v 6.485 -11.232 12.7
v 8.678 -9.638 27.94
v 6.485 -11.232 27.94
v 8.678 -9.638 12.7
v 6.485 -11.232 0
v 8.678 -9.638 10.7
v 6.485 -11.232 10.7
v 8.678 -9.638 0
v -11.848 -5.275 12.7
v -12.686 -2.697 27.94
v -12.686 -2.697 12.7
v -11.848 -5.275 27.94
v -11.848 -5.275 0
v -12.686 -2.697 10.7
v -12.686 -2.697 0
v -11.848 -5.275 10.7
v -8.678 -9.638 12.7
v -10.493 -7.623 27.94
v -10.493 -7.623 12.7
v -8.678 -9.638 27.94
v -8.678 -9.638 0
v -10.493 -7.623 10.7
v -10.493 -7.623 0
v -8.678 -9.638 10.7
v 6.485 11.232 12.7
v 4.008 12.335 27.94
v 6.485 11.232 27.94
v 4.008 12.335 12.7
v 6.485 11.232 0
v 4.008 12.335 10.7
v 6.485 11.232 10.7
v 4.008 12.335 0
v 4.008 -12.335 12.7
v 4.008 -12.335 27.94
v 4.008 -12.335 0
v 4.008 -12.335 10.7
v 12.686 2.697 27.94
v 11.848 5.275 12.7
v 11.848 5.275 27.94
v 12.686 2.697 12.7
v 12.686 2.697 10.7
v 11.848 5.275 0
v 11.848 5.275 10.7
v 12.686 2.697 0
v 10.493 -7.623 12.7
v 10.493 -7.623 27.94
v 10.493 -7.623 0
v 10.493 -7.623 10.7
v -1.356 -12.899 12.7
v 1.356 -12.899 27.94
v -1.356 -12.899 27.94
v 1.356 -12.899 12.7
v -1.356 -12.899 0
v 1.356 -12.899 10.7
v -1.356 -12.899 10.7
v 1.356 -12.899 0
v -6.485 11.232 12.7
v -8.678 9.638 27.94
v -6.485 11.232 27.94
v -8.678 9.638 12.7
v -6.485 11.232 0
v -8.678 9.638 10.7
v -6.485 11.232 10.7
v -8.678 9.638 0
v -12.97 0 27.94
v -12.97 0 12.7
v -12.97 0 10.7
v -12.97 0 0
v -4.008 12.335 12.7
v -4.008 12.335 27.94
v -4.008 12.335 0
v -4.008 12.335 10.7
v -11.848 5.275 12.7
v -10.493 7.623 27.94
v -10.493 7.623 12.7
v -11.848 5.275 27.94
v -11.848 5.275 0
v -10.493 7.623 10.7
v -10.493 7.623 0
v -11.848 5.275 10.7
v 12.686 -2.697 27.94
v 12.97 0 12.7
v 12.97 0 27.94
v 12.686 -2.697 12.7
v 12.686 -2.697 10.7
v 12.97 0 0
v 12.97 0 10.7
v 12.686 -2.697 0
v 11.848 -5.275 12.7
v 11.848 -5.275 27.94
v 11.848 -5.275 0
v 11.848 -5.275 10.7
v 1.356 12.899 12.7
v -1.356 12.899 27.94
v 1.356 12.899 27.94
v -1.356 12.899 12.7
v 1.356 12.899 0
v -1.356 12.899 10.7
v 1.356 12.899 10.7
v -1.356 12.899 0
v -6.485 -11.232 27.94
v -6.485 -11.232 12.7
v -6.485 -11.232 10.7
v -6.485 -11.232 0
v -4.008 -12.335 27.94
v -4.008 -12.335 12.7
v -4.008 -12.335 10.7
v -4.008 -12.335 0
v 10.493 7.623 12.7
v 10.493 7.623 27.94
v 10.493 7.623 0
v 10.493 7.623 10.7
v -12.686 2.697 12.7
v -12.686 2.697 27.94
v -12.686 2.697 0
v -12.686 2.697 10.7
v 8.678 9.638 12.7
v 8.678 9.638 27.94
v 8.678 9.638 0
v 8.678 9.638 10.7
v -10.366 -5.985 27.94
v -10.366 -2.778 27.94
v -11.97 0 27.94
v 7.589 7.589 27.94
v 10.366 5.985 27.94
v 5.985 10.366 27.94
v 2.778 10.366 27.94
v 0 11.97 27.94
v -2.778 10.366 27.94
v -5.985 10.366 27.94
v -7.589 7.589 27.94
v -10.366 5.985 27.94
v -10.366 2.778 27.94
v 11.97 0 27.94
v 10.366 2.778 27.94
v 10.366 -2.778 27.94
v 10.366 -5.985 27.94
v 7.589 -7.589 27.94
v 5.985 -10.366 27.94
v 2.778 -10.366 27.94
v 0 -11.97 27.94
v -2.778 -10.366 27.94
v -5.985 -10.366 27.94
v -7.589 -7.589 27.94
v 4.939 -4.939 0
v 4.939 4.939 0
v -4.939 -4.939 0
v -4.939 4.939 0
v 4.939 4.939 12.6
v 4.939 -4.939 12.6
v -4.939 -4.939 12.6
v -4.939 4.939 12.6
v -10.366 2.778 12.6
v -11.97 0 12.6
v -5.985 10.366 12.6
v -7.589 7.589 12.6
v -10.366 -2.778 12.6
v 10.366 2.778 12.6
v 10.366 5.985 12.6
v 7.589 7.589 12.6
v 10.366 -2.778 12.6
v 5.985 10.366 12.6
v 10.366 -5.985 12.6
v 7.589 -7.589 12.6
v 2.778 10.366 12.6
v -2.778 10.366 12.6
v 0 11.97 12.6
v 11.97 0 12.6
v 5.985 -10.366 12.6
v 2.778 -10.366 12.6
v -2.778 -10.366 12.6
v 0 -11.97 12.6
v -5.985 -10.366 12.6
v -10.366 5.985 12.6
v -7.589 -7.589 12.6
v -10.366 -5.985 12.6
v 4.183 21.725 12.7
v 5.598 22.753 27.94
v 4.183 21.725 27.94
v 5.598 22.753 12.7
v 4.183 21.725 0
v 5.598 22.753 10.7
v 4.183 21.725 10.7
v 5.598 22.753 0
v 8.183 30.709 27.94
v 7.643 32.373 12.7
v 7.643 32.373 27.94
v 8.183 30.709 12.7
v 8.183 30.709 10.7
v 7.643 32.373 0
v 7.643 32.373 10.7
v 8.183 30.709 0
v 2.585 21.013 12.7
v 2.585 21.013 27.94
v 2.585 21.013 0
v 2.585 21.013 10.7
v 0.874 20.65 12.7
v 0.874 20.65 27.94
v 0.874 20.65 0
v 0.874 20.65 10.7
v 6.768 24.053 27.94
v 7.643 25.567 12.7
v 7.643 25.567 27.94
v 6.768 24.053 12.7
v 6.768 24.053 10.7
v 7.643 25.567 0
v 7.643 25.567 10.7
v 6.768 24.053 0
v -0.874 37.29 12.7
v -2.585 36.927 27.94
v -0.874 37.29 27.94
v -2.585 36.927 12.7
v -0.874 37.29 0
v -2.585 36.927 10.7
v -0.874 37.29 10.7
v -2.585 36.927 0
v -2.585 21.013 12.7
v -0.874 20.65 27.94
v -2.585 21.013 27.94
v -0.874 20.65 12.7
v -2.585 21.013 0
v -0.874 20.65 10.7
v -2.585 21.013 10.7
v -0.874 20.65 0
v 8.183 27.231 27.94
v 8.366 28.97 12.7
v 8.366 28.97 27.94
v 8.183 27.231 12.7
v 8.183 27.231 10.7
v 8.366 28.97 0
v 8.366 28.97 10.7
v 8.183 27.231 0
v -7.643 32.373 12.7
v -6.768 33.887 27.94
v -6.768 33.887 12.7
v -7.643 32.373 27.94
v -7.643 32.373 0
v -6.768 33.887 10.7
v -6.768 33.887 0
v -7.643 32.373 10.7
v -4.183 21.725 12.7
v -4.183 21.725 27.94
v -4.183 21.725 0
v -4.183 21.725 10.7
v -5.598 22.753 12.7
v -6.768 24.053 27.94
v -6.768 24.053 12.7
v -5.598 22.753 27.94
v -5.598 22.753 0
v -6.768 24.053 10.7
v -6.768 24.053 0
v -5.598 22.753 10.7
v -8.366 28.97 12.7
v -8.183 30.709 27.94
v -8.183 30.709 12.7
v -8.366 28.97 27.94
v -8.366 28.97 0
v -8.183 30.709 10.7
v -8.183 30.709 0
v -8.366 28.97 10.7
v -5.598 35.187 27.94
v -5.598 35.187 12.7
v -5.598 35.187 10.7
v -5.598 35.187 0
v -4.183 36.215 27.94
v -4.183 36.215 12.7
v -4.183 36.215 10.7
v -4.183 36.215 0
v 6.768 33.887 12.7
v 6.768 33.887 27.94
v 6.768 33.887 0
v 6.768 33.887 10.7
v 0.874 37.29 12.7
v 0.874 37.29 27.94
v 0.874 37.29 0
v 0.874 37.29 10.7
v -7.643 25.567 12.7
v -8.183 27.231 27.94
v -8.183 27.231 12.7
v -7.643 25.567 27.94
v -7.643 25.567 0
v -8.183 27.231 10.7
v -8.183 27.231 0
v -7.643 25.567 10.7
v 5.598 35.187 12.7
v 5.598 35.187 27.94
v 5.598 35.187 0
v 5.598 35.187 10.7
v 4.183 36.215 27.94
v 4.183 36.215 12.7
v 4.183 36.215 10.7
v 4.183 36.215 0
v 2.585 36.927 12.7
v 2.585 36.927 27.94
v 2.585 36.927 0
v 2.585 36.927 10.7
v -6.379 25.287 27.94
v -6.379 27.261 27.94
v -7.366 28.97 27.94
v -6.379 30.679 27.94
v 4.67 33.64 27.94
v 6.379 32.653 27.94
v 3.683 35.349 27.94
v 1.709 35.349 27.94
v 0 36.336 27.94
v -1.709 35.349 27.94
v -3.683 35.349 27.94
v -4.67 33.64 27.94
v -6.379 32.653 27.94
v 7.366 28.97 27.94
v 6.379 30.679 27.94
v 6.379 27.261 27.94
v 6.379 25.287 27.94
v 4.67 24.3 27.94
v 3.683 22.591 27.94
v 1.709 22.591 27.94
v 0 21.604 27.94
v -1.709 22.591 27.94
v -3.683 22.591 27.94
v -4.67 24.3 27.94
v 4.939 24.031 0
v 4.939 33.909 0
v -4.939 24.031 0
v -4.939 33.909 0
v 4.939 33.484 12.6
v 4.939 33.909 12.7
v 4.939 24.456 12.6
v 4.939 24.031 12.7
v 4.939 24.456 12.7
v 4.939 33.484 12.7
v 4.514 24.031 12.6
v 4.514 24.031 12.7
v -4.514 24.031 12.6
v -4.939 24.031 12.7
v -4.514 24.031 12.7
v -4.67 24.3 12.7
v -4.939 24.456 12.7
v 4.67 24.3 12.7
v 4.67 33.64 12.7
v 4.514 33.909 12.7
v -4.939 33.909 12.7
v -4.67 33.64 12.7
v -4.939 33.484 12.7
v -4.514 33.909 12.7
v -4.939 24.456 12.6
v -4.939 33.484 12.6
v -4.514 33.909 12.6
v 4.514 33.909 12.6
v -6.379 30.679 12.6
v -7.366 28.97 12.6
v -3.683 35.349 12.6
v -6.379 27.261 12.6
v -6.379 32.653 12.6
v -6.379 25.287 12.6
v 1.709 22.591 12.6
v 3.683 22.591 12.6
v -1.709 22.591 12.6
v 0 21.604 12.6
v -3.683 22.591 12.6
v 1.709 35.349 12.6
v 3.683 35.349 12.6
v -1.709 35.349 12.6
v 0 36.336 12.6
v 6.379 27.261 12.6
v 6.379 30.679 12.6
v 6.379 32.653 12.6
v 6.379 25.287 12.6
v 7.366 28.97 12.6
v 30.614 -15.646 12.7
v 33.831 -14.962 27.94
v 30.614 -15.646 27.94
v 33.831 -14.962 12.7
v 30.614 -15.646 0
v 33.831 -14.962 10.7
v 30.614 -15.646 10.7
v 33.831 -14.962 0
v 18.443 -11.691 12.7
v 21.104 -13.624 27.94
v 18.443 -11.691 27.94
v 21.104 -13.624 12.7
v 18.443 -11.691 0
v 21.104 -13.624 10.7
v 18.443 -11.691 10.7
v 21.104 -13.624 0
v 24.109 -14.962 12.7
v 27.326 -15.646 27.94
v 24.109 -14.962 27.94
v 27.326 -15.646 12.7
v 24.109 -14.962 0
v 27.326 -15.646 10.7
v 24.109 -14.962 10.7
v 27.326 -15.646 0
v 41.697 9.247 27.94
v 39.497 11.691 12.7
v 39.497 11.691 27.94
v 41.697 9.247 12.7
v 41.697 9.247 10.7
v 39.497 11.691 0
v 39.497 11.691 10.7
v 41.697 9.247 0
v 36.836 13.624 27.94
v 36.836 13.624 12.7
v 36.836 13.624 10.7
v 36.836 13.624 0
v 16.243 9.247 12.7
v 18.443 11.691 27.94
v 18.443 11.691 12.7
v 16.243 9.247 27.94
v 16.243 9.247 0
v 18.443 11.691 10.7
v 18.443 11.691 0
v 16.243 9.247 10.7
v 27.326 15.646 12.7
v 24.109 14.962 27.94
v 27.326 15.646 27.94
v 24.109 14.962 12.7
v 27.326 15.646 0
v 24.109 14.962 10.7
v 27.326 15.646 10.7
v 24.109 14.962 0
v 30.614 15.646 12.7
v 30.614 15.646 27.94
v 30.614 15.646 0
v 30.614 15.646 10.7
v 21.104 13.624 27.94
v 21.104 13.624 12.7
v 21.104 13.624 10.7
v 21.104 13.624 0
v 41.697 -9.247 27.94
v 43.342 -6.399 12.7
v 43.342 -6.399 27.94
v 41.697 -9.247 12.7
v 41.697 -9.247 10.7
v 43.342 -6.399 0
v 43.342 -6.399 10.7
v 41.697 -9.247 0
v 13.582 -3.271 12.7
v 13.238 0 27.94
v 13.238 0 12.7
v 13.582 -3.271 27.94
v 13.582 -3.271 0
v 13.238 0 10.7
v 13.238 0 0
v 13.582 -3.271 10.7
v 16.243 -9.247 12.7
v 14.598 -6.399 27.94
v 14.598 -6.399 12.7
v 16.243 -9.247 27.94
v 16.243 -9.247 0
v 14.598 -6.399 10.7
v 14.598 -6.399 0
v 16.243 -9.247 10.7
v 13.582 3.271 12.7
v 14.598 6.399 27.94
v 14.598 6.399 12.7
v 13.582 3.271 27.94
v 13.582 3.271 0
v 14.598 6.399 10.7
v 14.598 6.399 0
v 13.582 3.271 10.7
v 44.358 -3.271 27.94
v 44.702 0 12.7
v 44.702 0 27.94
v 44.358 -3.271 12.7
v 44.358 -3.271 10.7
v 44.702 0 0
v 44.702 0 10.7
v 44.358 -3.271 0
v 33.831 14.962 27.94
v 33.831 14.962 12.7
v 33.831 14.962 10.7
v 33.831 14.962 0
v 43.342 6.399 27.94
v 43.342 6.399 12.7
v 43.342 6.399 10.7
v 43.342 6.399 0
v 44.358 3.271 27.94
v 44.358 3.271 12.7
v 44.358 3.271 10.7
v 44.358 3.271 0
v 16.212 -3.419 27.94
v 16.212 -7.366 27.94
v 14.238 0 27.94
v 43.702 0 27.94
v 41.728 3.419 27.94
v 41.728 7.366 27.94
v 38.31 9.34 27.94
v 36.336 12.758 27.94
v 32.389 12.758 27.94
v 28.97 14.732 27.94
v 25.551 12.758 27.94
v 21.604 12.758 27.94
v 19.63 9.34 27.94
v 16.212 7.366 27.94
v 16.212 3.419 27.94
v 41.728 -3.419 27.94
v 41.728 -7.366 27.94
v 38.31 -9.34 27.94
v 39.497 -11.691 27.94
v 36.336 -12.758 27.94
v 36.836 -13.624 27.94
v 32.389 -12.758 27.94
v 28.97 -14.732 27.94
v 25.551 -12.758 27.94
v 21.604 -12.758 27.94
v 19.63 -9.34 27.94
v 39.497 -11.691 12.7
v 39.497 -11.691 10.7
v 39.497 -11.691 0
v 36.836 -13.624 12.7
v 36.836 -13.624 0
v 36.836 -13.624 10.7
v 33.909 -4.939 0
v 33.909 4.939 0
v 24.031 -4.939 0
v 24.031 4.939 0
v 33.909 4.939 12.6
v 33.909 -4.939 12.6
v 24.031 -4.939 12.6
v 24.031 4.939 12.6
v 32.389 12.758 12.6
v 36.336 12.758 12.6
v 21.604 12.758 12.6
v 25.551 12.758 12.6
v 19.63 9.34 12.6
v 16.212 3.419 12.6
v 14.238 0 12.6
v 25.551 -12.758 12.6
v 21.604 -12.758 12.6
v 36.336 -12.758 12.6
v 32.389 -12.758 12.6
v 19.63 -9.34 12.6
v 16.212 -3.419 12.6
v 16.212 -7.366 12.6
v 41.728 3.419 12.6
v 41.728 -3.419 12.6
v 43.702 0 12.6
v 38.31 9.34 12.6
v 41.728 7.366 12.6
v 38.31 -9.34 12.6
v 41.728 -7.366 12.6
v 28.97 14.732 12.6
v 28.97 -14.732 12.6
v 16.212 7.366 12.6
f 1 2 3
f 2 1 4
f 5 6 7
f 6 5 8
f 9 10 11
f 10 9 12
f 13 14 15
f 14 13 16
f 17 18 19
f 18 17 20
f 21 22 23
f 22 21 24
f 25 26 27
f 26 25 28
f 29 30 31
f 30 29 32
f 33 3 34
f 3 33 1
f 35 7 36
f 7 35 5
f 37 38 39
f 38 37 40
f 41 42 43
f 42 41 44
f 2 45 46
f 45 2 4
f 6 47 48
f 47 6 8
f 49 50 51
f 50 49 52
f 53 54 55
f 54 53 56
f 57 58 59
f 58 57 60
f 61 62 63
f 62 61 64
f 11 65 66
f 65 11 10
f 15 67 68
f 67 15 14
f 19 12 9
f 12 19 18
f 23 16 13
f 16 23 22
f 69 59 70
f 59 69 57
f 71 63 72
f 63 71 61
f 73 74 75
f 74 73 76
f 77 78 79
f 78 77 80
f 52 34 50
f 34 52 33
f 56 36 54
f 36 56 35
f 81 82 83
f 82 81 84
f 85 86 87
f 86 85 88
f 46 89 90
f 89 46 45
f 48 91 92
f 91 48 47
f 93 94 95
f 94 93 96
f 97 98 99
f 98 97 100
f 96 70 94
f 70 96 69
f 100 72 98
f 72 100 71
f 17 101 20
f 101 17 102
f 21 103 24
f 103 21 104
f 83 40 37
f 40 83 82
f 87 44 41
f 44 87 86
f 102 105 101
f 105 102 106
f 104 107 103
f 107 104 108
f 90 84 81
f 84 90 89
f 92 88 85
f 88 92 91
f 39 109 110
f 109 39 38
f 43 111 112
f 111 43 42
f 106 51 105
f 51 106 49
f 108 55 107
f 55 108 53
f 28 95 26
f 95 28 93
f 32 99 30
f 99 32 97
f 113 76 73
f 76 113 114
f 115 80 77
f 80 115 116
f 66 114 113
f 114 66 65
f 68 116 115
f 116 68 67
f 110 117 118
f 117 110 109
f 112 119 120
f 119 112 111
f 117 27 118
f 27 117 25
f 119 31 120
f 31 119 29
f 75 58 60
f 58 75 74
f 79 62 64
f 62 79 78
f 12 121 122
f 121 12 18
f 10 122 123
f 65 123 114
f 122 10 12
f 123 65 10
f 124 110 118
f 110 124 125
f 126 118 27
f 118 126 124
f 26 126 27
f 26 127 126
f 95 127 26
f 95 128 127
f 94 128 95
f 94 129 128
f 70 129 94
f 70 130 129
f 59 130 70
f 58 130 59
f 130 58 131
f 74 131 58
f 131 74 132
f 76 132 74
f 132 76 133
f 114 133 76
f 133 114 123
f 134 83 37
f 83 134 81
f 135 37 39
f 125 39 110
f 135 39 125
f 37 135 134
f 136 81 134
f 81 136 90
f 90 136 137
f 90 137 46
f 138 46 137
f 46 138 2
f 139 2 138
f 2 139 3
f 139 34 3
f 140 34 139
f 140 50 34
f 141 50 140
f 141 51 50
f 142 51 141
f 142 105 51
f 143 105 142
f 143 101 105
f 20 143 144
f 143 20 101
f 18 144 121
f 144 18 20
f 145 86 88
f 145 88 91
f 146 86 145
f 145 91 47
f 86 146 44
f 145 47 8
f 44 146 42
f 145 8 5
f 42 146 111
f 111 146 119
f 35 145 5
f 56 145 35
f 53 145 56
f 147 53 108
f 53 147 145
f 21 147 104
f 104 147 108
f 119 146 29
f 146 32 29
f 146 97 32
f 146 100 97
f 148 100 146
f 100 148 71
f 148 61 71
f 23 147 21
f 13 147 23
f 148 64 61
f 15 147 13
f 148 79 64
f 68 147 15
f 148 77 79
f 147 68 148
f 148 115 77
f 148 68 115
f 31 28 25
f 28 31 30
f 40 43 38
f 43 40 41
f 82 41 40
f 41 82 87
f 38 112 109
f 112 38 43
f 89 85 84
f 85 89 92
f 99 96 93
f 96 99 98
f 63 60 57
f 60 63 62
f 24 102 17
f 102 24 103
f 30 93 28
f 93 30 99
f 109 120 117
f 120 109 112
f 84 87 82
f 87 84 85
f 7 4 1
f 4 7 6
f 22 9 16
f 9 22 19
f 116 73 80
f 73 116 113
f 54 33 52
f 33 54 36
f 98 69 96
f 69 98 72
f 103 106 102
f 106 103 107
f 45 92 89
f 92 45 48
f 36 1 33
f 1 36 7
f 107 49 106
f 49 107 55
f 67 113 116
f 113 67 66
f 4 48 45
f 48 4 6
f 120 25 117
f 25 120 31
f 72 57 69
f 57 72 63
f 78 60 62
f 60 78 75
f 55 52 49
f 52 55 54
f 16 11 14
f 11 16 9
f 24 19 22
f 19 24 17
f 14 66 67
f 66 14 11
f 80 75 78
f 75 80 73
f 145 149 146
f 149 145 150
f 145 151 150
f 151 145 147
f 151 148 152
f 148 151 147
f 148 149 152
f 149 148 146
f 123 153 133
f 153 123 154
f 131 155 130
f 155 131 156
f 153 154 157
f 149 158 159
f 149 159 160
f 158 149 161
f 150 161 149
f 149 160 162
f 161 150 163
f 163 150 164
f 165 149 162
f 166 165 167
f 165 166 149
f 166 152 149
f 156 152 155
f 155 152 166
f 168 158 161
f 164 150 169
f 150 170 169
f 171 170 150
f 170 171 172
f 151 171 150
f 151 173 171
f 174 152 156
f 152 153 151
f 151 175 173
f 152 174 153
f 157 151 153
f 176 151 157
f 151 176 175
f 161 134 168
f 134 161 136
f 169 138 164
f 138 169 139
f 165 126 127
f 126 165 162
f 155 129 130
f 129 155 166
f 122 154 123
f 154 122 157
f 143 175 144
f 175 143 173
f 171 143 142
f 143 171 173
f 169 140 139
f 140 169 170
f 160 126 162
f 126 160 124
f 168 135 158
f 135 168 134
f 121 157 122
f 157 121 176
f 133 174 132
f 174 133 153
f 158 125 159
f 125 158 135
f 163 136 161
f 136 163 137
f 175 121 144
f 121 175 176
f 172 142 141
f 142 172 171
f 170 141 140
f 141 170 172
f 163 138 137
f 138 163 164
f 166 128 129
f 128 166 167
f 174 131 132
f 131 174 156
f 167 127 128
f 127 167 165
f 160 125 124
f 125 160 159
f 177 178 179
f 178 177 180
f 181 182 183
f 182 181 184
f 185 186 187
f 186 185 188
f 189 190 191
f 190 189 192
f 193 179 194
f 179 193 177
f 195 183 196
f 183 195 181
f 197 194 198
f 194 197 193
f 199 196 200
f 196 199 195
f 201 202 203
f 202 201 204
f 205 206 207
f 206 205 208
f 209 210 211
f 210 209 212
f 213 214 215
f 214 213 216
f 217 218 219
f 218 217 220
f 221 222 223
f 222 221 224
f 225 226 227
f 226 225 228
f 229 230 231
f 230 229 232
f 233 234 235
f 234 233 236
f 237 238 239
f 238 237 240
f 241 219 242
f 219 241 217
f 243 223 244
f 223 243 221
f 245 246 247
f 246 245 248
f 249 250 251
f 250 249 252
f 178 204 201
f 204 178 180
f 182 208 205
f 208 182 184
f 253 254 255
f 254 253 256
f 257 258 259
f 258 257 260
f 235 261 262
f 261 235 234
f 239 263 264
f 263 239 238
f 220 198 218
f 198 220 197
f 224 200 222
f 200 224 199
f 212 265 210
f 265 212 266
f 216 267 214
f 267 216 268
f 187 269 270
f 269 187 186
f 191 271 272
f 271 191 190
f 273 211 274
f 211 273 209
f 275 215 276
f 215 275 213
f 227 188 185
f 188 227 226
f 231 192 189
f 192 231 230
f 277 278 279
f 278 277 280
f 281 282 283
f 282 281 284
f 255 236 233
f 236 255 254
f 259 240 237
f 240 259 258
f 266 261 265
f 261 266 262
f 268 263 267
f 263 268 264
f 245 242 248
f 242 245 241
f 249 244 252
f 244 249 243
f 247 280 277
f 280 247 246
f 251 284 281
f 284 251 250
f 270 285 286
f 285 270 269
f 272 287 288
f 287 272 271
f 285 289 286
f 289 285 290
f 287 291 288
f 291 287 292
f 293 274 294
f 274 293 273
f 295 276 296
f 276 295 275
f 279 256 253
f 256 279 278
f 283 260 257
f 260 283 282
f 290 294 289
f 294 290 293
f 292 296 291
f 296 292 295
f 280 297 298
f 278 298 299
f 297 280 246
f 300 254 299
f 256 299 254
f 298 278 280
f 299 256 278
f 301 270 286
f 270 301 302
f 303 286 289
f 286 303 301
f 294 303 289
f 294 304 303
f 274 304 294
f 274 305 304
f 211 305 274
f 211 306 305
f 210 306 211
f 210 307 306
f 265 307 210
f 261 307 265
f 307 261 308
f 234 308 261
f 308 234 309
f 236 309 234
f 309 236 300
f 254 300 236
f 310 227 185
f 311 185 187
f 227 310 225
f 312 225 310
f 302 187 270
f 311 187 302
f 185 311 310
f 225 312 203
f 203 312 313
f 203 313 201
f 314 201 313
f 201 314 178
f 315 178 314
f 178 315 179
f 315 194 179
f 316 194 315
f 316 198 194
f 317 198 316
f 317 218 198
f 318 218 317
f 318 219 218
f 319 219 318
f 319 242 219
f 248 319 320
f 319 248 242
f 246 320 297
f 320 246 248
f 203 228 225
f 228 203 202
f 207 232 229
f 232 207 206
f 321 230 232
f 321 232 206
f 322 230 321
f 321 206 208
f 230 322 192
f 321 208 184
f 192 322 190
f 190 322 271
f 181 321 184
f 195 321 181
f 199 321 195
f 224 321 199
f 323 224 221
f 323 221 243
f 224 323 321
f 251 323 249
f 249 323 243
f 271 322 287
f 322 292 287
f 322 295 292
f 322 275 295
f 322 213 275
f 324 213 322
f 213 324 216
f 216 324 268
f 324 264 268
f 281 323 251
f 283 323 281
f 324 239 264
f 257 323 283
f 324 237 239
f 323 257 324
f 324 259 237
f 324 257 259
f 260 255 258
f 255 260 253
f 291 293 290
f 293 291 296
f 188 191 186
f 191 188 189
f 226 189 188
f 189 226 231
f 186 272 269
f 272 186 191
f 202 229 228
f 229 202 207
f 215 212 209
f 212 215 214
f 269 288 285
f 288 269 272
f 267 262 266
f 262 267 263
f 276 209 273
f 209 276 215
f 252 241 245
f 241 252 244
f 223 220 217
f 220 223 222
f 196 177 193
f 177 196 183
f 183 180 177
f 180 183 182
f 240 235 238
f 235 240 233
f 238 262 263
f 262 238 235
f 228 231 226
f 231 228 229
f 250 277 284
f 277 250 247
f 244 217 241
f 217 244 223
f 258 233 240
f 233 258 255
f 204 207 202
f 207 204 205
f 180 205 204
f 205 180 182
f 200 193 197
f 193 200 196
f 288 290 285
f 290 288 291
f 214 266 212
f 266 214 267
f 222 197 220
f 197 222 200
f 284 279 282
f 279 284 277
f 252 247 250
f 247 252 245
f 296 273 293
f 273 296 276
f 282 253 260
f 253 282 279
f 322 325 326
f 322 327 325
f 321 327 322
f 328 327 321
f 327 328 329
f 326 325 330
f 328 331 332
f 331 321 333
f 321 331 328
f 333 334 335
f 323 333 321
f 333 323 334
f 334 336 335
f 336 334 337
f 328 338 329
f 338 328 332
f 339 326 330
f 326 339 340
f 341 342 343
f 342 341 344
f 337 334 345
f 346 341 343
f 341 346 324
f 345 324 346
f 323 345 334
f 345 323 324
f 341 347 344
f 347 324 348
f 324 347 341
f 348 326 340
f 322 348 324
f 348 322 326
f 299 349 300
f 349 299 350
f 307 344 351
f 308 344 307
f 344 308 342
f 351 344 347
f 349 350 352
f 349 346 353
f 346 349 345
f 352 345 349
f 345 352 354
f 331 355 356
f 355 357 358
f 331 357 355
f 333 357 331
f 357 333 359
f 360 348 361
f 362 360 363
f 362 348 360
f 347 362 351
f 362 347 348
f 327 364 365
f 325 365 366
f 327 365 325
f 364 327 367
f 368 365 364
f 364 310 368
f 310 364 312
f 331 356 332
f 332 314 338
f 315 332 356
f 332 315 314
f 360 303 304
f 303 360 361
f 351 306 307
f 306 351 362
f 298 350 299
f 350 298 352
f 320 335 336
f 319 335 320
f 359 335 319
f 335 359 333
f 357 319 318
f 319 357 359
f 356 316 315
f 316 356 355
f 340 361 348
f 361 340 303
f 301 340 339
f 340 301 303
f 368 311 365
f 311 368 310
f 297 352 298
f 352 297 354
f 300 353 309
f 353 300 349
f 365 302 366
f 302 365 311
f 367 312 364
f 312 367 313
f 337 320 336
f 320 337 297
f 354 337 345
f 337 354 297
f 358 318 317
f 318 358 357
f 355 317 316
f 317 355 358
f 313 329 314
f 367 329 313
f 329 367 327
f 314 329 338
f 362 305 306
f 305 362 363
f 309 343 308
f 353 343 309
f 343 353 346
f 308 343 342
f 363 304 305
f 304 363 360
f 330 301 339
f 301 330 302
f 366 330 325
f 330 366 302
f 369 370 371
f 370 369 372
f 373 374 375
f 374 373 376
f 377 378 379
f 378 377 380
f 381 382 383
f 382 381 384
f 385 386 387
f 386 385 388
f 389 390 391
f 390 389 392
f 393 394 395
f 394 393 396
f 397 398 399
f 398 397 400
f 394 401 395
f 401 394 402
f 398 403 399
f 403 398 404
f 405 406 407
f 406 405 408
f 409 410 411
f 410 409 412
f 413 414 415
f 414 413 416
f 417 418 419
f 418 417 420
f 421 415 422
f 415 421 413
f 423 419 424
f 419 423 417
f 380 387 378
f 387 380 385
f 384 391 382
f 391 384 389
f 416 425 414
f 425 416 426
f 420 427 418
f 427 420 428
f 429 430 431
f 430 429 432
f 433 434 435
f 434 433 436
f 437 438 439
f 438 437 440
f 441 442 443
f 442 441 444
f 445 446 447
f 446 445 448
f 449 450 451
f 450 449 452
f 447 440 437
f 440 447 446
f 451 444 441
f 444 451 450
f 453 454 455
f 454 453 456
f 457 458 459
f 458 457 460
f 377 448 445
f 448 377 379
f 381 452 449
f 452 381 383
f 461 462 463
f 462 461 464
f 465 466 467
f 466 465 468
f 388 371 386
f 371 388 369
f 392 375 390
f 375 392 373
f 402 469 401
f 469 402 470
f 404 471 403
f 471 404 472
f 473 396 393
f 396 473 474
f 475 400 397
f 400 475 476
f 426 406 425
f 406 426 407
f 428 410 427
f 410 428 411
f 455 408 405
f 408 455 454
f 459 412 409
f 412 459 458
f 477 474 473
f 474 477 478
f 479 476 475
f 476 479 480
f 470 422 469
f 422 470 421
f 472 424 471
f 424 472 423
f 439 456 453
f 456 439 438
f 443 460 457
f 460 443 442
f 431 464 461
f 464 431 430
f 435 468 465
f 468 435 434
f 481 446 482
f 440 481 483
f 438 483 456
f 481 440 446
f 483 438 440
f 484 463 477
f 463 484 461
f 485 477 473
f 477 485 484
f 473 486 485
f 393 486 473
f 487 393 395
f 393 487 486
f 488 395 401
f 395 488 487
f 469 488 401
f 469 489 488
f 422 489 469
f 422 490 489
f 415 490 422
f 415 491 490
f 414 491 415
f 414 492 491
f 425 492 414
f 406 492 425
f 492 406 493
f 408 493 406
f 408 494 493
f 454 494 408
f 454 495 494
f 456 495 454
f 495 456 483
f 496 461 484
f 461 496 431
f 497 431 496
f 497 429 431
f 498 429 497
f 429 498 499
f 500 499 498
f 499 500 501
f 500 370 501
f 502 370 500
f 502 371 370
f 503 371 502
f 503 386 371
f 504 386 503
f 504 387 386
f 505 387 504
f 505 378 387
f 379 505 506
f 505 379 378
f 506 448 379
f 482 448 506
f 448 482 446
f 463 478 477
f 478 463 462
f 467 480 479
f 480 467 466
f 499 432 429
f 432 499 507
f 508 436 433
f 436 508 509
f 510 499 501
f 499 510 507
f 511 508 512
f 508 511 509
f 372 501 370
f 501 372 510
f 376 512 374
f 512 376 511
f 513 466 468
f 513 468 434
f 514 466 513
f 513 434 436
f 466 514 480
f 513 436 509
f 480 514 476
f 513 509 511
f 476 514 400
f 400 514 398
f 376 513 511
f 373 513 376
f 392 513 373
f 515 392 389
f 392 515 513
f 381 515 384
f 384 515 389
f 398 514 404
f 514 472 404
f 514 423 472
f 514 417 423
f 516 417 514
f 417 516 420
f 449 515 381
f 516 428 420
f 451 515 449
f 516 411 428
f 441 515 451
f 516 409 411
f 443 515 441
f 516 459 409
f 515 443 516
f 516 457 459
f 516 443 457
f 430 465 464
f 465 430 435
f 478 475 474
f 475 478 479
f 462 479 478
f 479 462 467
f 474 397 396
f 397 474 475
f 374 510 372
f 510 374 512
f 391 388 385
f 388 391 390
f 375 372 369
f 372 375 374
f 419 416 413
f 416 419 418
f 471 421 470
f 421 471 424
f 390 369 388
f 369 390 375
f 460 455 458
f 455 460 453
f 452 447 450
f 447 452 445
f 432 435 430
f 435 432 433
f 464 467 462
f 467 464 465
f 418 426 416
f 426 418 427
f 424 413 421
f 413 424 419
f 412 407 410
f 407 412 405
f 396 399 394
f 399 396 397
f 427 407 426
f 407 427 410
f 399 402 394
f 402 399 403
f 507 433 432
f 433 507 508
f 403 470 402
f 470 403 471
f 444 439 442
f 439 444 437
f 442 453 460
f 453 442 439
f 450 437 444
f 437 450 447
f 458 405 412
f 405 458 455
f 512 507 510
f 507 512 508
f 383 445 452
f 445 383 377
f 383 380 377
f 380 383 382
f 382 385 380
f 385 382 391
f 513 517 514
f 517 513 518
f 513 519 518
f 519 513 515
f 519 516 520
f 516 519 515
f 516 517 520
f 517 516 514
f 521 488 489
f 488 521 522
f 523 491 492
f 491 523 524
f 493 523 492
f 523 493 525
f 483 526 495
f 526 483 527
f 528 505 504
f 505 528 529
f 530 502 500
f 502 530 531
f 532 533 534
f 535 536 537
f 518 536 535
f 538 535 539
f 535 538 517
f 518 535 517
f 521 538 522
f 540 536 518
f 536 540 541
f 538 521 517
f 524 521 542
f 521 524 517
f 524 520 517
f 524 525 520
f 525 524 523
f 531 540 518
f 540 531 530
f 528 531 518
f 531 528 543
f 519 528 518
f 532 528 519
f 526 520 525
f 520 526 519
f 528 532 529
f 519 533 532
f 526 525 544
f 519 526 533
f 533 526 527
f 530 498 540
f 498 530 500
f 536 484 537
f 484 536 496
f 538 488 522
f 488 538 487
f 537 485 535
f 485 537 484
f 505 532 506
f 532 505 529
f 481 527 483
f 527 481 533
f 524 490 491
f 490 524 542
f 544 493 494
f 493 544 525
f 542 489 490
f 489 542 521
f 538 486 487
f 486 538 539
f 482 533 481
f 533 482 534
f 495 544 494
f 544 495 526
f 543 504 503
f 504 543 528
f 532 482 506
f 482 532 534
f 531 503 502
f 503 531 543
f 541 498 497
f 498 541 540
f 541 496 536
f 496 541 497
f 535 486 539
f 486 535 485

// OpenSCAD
// Sockets

type = "Double Hex"; // [Hex, Double Hex]
base_size = .5;
base_depth = .5;
socket_sizes = [13/16,1/2,1];
socket_length = .6;
style = "Straight"; //[Tapered, Straight]
spacing = 15;
number = len(socket_sizes);
units = "Imperial"; //[Imperial, Metric]


xc = number;
yc = round(sqrt(number));
count = number;
if(units=="Imperial"){
    if(type == "Hex"){
        build_socket_imperial();
    }
    if(type == "Double Hex"){
        build_socket_imperial_double();
    }
}
else{
    if(type == "Hex"){
        build_socket_metric();
    }
    if(type == "Double Hex"){
        build_socket_metric_double();
    }
}
module build_socket_metric(){
    
    for(x=[0:xc-1]){
        for(y=[0:yc-1]){
            county= count-y;
            if(county>0){
                base_size = base_size*1.1;
                socket_sizes = socket_sizes*1.16;
                difference(){
                    union(){
                        translate([x*(base_size+         spacing),y*(base_size+spacing),base_depth+1]) linear_extrude (height = socket_length, center = false, convexity = 10) polygon(ngon(30, socket_sizes[y+(yc*x)]/2+1));
                        
                        
                        if(style == "Straight" && socket_sizes[y+(yc*x)] > base_size){
                            translate([x*(base_size+spacing),y*(base_size+spacing),0]) linear_extrude (height = base_depth, center = false, convexity = 10) polygon(ngon(30, socket_sizes[y+(yc*x)]/2+1));
                        }
                        else
                            {
                        translate([x*(base_size+spacing),y*(base_size+spacing),0]) linear_extrude (height = base_depth, center = false, convexity = 10) polygon(ngon(30, (base_size+2)/2));
                        }
                        if(socket_sizes[y+(yc*x)] > base_size){
                            translate([x*(base_size+spacing),y*(base_size+spacing),base_depth-2]) cylinder($fn=30, h = 3, r1 = socket_sizes[y+(yc*x)]/2+1, r2 = socket_sizes[y+(yc*x)]/2+1);
                        }
                        else{
                            translate([x*(base_size+spacing),y*(base_size+spacing),base_depth]) cylinder($fn=30, h = 3, r1 = base_size/2+1, r2 = socket_sizes[y+(yc*x)]/2+1);
                            }
                        
                    }
               translate([x*(base_size+spacing),y*(base_size+spacing),-.1]) linear_extrude (height = base_depth+.5, center = false, convexity = 10) polygon(ngon(4, base_size/2));
                    translate([x*(base_size+spacing),y*(base_size+spacing),base_depth-.5]) linear_extrude (height = socket_length+2, center = false, convexity = 10) polygon(ngon(6, socket_sizes[y+(yc*x)]/2));
                }
                
                
            }
        }
        count = count-x*yc;
    }
}

module build_socket_metric_double(){
    
    for(x=[0:xc-1]){
        for(y=[0:yc-1]){
            county= count-y;
            if(county>0){
                base_size = base_size*1.1;
                socket_sizes = socket_sizes*1.16;
                difference(){
                    union(){
                        translate([x*(base_size+         spacing),y*(base_size+spacing),base_depth+1]) linear_extrude (height = socket_length, center = false, convexity = 10) polygon(ngon(30, socket_sizes[y+(yc*x)]/2+1));
                        
                        
                        if(style == "Straight" && socket_sizes[y+(yc*x)] > base_size){
                            translate([x*(base_size+spacing),y*(base_size+spacing),0]) linear_extrude (height = base_depth, center = false, convexity = 10) polygon(ngon(30, socket_sizes[y+(yc*x)]/2+1));
                        }
                        else
                            {
                        translate([x*(base_size+spacing),y*(base_size+spacing),0]) linear_extrude (height = base_depth, center = false, convexity = 10) polygon(ngon(30, (base_size+2)/2));
                        }
                        if(socket_sizes[y+(yc*x)] > base_size){
                            translate([x*(base_size+spacing),y*(base_size+spacing),base_depth-2]) cylinder($fn=30, h = 3, r1 = socket_sizes[y+(yc*x)]/2+1, r2 = socket_sizes[y+(yc*x)]/2+1);
                        }
                        else{
                            translate([x*(base_size+spacing),y*(base_size+spacing),base_depth]) cylinder($fn=30, h = 3, r1 = base_size/2+1, r2 = socket_sizes[y+(yc*x)]/2+1);
                            }
                        
                    }
               translate([x*(base_size+spacing),y*(base_size+spacing),-.1]) linear_extrude (height = base_depth+.5, center = false, convexity = 10) polygon(ngon(4, base_size/2));
                    translate([x*(base_size+spacing),y*(base_size+spacing),base_depth-.5]) linear_extrude (height = socket_length+2, center = false, convexity = 10) polygon(ngon(6, socket_sizes[y+(yc*x)]/2));
                    translate([x*(base_size+spacing),y*(base_size+spacing),base_depth-.5]) rotate(30) linear_extrude (height = socket_length+2, center = false, convexity = 10) polygon(ngon(6, socket_sizes[y+(yc*x)]/2));
                }
                
                
            }
        }
        count = count-x*yc;
    }
}


module build_socket_imperial(){
    
    for(x=[0:xc-1]){
        for(y=[0:yc-1]){
            county= count-y;
            if(county>0){
                conv = 25.4;
                base_size = (base_size*conv)*1.1;
                base_depth = base_depth*conv;
                socket_sizes = (socket_sizes*conv)*1.16;
                socket_length = socket_length*conv;
                spacing = spacing;
                difference(){
                    union(){
                        translate([x*(base_size+spacing),y*(base_size+spacing),base_depth]) linear_extrude (height = socket_length, center = false, convexity = 10) polygon(ngon(30, socket_sizes[y+(yc*x)]/2+1));
  
                        if(style == "Straight" && socket_sizes[y+(yc*x)] > base_size){
                            translate([x*(base_size+spacing),y*(base_size+spacing),0]) linear_extrude (height = base_depth, center = false, convexity = 10) polygon(ngon(30, socket_sizes[y+(yc*x)]/2+1));
                        }
                        else
                            {
                        translate([x*(base_size+spacing),y*(base_size+spacing),0]) linear_extrude (height = base_depth, center = false, convexity = 10) polygon(ngon(30, (base_size+2)/2));
                        }
                        if(socket_sizes[y+(yc*x)] > base_size){
                            translate([x*(base_size+spacing),y*(base_size+spacing),base_depth-2]) cylinder($fn=30, h = 2, r1 = socket_sizes[y+(yc*x)]/2+1, r2 = socket_sizes[y+(yc*x)]/2+1);
                        }
                        else{
                            translate([x*(base_size+spacing),y*(base_size+spacing),base_depth]) cylinder($fn=30, h = 3, r1 = base_size/2+1, r2 = socket_sizes[y+(yc*x)]/2+1);
                            }
                    }
               translate([x*(base_size+spacing),y*(base_size+spacing),-.1]) rotate (45) linear_extrude (height = base_depth+.1, center = false, convexity = 10) polygon(ngon(4, base_size/2));
                    translate([x*(base_size+spacing),y*(base_size+spacing),base_depth-.1]) linear_extrude (height = socket_length+1, center = false, convexity = 10) polygon(ngon(6, socket_sizes[y+(yc*x)]/2));
                
                   
                    }
                
            }
        }
        count = count-x*yc;
    }
}

module build_socket_imperial_double(){
    
    for(x=[0:xc-1]){
        for(y=[0:yc-1]){
            county= count-y;
            if(county>0){
                conv = 25.4;
                base_size = (base_size*conv)*1.1;
                base_depth = base_depth*conv;
                socket_sizes = (socket_sizes*conv)*1.16;
                socket_length = socket_length*conv;
                spacing = spacing;
                difference(){
                    union(){
                        translate([x*(base_size+spacing),y*(base_size+spacing),base_depth]) linear_extrude (height = socket_length, center = false, convexity = 10) polygon(ngon(30, socket_sizes[y+(yc*x)]/2+1));
  
                        if(style == "Straight" && socket_sizes[y+(yc*x)] > base_size){
                            translate([x*(base_size+spacing),y*(base_size+spacing),0]) linear_extrude (height = base_depth, center = false, convexity = 10) polygon(ngon(30, socket_sizes[y+(yc*x)]/2+1));
                        }
                        else
                            {
                        translate([x*(base_size+spacing),y*(base_size+spacing),0]) linear_extrude (height = base_depth, center = false, convexity = 10) polygon(ngon(30, (base_size+2)/2));
                        }
                        if(socket_sizes[y+(yc*x)] > base_size){
                            translate([x*(base_size+spacing),y*(base_size+spacing),base_depth-2]) cylinder($fn=30, h = 2, r1 = socket_sizes[y+(yc*x)]/2+1, r2 = socket_sizes[y+(yc*x)]/2+1);
                        }
                        else{
                            translate([x*(base_size+spacing),y*(base_size+spacing),base_depth]) cylinder($fn=30, h = 3, r1 = base_size/2+1, r2 = socket_sizes[y+(yc*x)]/2+1);
                            }
                    }
               translate([x*(base_size+spacing),y*(base_size+spacing),-.1]) rotate (45) linear_extrude (height = base_depth+.1, center = false, convexity = 10) polygon(ngon(4, base_size/2));
                    translate([x*(base_size+spacing),y*(base_size+spacing),base_depth-.1]) linear_extrude (height = socket_length+1, center = false, convexity = 10) polygon(ngon(6, socket_sizes[y+(yc*x)]/2));
                    translate([x*(base_size+spacing),y*(base_size+spacing),base_depth-.1]) rotate(30) linear_extrude (height = socket_length+1, center = false, convexity = 10) polygon(ngon(6, socket_sizes[y+(yc*x)]/2));
                
                   
                    }
                
            }
        }
        count = count-x*yc;
    }
}

function ngon(num, r) = 
    [for (i=[0:num-1], a=i*360/num) [ r*cos(a), r*sin(a)]];
